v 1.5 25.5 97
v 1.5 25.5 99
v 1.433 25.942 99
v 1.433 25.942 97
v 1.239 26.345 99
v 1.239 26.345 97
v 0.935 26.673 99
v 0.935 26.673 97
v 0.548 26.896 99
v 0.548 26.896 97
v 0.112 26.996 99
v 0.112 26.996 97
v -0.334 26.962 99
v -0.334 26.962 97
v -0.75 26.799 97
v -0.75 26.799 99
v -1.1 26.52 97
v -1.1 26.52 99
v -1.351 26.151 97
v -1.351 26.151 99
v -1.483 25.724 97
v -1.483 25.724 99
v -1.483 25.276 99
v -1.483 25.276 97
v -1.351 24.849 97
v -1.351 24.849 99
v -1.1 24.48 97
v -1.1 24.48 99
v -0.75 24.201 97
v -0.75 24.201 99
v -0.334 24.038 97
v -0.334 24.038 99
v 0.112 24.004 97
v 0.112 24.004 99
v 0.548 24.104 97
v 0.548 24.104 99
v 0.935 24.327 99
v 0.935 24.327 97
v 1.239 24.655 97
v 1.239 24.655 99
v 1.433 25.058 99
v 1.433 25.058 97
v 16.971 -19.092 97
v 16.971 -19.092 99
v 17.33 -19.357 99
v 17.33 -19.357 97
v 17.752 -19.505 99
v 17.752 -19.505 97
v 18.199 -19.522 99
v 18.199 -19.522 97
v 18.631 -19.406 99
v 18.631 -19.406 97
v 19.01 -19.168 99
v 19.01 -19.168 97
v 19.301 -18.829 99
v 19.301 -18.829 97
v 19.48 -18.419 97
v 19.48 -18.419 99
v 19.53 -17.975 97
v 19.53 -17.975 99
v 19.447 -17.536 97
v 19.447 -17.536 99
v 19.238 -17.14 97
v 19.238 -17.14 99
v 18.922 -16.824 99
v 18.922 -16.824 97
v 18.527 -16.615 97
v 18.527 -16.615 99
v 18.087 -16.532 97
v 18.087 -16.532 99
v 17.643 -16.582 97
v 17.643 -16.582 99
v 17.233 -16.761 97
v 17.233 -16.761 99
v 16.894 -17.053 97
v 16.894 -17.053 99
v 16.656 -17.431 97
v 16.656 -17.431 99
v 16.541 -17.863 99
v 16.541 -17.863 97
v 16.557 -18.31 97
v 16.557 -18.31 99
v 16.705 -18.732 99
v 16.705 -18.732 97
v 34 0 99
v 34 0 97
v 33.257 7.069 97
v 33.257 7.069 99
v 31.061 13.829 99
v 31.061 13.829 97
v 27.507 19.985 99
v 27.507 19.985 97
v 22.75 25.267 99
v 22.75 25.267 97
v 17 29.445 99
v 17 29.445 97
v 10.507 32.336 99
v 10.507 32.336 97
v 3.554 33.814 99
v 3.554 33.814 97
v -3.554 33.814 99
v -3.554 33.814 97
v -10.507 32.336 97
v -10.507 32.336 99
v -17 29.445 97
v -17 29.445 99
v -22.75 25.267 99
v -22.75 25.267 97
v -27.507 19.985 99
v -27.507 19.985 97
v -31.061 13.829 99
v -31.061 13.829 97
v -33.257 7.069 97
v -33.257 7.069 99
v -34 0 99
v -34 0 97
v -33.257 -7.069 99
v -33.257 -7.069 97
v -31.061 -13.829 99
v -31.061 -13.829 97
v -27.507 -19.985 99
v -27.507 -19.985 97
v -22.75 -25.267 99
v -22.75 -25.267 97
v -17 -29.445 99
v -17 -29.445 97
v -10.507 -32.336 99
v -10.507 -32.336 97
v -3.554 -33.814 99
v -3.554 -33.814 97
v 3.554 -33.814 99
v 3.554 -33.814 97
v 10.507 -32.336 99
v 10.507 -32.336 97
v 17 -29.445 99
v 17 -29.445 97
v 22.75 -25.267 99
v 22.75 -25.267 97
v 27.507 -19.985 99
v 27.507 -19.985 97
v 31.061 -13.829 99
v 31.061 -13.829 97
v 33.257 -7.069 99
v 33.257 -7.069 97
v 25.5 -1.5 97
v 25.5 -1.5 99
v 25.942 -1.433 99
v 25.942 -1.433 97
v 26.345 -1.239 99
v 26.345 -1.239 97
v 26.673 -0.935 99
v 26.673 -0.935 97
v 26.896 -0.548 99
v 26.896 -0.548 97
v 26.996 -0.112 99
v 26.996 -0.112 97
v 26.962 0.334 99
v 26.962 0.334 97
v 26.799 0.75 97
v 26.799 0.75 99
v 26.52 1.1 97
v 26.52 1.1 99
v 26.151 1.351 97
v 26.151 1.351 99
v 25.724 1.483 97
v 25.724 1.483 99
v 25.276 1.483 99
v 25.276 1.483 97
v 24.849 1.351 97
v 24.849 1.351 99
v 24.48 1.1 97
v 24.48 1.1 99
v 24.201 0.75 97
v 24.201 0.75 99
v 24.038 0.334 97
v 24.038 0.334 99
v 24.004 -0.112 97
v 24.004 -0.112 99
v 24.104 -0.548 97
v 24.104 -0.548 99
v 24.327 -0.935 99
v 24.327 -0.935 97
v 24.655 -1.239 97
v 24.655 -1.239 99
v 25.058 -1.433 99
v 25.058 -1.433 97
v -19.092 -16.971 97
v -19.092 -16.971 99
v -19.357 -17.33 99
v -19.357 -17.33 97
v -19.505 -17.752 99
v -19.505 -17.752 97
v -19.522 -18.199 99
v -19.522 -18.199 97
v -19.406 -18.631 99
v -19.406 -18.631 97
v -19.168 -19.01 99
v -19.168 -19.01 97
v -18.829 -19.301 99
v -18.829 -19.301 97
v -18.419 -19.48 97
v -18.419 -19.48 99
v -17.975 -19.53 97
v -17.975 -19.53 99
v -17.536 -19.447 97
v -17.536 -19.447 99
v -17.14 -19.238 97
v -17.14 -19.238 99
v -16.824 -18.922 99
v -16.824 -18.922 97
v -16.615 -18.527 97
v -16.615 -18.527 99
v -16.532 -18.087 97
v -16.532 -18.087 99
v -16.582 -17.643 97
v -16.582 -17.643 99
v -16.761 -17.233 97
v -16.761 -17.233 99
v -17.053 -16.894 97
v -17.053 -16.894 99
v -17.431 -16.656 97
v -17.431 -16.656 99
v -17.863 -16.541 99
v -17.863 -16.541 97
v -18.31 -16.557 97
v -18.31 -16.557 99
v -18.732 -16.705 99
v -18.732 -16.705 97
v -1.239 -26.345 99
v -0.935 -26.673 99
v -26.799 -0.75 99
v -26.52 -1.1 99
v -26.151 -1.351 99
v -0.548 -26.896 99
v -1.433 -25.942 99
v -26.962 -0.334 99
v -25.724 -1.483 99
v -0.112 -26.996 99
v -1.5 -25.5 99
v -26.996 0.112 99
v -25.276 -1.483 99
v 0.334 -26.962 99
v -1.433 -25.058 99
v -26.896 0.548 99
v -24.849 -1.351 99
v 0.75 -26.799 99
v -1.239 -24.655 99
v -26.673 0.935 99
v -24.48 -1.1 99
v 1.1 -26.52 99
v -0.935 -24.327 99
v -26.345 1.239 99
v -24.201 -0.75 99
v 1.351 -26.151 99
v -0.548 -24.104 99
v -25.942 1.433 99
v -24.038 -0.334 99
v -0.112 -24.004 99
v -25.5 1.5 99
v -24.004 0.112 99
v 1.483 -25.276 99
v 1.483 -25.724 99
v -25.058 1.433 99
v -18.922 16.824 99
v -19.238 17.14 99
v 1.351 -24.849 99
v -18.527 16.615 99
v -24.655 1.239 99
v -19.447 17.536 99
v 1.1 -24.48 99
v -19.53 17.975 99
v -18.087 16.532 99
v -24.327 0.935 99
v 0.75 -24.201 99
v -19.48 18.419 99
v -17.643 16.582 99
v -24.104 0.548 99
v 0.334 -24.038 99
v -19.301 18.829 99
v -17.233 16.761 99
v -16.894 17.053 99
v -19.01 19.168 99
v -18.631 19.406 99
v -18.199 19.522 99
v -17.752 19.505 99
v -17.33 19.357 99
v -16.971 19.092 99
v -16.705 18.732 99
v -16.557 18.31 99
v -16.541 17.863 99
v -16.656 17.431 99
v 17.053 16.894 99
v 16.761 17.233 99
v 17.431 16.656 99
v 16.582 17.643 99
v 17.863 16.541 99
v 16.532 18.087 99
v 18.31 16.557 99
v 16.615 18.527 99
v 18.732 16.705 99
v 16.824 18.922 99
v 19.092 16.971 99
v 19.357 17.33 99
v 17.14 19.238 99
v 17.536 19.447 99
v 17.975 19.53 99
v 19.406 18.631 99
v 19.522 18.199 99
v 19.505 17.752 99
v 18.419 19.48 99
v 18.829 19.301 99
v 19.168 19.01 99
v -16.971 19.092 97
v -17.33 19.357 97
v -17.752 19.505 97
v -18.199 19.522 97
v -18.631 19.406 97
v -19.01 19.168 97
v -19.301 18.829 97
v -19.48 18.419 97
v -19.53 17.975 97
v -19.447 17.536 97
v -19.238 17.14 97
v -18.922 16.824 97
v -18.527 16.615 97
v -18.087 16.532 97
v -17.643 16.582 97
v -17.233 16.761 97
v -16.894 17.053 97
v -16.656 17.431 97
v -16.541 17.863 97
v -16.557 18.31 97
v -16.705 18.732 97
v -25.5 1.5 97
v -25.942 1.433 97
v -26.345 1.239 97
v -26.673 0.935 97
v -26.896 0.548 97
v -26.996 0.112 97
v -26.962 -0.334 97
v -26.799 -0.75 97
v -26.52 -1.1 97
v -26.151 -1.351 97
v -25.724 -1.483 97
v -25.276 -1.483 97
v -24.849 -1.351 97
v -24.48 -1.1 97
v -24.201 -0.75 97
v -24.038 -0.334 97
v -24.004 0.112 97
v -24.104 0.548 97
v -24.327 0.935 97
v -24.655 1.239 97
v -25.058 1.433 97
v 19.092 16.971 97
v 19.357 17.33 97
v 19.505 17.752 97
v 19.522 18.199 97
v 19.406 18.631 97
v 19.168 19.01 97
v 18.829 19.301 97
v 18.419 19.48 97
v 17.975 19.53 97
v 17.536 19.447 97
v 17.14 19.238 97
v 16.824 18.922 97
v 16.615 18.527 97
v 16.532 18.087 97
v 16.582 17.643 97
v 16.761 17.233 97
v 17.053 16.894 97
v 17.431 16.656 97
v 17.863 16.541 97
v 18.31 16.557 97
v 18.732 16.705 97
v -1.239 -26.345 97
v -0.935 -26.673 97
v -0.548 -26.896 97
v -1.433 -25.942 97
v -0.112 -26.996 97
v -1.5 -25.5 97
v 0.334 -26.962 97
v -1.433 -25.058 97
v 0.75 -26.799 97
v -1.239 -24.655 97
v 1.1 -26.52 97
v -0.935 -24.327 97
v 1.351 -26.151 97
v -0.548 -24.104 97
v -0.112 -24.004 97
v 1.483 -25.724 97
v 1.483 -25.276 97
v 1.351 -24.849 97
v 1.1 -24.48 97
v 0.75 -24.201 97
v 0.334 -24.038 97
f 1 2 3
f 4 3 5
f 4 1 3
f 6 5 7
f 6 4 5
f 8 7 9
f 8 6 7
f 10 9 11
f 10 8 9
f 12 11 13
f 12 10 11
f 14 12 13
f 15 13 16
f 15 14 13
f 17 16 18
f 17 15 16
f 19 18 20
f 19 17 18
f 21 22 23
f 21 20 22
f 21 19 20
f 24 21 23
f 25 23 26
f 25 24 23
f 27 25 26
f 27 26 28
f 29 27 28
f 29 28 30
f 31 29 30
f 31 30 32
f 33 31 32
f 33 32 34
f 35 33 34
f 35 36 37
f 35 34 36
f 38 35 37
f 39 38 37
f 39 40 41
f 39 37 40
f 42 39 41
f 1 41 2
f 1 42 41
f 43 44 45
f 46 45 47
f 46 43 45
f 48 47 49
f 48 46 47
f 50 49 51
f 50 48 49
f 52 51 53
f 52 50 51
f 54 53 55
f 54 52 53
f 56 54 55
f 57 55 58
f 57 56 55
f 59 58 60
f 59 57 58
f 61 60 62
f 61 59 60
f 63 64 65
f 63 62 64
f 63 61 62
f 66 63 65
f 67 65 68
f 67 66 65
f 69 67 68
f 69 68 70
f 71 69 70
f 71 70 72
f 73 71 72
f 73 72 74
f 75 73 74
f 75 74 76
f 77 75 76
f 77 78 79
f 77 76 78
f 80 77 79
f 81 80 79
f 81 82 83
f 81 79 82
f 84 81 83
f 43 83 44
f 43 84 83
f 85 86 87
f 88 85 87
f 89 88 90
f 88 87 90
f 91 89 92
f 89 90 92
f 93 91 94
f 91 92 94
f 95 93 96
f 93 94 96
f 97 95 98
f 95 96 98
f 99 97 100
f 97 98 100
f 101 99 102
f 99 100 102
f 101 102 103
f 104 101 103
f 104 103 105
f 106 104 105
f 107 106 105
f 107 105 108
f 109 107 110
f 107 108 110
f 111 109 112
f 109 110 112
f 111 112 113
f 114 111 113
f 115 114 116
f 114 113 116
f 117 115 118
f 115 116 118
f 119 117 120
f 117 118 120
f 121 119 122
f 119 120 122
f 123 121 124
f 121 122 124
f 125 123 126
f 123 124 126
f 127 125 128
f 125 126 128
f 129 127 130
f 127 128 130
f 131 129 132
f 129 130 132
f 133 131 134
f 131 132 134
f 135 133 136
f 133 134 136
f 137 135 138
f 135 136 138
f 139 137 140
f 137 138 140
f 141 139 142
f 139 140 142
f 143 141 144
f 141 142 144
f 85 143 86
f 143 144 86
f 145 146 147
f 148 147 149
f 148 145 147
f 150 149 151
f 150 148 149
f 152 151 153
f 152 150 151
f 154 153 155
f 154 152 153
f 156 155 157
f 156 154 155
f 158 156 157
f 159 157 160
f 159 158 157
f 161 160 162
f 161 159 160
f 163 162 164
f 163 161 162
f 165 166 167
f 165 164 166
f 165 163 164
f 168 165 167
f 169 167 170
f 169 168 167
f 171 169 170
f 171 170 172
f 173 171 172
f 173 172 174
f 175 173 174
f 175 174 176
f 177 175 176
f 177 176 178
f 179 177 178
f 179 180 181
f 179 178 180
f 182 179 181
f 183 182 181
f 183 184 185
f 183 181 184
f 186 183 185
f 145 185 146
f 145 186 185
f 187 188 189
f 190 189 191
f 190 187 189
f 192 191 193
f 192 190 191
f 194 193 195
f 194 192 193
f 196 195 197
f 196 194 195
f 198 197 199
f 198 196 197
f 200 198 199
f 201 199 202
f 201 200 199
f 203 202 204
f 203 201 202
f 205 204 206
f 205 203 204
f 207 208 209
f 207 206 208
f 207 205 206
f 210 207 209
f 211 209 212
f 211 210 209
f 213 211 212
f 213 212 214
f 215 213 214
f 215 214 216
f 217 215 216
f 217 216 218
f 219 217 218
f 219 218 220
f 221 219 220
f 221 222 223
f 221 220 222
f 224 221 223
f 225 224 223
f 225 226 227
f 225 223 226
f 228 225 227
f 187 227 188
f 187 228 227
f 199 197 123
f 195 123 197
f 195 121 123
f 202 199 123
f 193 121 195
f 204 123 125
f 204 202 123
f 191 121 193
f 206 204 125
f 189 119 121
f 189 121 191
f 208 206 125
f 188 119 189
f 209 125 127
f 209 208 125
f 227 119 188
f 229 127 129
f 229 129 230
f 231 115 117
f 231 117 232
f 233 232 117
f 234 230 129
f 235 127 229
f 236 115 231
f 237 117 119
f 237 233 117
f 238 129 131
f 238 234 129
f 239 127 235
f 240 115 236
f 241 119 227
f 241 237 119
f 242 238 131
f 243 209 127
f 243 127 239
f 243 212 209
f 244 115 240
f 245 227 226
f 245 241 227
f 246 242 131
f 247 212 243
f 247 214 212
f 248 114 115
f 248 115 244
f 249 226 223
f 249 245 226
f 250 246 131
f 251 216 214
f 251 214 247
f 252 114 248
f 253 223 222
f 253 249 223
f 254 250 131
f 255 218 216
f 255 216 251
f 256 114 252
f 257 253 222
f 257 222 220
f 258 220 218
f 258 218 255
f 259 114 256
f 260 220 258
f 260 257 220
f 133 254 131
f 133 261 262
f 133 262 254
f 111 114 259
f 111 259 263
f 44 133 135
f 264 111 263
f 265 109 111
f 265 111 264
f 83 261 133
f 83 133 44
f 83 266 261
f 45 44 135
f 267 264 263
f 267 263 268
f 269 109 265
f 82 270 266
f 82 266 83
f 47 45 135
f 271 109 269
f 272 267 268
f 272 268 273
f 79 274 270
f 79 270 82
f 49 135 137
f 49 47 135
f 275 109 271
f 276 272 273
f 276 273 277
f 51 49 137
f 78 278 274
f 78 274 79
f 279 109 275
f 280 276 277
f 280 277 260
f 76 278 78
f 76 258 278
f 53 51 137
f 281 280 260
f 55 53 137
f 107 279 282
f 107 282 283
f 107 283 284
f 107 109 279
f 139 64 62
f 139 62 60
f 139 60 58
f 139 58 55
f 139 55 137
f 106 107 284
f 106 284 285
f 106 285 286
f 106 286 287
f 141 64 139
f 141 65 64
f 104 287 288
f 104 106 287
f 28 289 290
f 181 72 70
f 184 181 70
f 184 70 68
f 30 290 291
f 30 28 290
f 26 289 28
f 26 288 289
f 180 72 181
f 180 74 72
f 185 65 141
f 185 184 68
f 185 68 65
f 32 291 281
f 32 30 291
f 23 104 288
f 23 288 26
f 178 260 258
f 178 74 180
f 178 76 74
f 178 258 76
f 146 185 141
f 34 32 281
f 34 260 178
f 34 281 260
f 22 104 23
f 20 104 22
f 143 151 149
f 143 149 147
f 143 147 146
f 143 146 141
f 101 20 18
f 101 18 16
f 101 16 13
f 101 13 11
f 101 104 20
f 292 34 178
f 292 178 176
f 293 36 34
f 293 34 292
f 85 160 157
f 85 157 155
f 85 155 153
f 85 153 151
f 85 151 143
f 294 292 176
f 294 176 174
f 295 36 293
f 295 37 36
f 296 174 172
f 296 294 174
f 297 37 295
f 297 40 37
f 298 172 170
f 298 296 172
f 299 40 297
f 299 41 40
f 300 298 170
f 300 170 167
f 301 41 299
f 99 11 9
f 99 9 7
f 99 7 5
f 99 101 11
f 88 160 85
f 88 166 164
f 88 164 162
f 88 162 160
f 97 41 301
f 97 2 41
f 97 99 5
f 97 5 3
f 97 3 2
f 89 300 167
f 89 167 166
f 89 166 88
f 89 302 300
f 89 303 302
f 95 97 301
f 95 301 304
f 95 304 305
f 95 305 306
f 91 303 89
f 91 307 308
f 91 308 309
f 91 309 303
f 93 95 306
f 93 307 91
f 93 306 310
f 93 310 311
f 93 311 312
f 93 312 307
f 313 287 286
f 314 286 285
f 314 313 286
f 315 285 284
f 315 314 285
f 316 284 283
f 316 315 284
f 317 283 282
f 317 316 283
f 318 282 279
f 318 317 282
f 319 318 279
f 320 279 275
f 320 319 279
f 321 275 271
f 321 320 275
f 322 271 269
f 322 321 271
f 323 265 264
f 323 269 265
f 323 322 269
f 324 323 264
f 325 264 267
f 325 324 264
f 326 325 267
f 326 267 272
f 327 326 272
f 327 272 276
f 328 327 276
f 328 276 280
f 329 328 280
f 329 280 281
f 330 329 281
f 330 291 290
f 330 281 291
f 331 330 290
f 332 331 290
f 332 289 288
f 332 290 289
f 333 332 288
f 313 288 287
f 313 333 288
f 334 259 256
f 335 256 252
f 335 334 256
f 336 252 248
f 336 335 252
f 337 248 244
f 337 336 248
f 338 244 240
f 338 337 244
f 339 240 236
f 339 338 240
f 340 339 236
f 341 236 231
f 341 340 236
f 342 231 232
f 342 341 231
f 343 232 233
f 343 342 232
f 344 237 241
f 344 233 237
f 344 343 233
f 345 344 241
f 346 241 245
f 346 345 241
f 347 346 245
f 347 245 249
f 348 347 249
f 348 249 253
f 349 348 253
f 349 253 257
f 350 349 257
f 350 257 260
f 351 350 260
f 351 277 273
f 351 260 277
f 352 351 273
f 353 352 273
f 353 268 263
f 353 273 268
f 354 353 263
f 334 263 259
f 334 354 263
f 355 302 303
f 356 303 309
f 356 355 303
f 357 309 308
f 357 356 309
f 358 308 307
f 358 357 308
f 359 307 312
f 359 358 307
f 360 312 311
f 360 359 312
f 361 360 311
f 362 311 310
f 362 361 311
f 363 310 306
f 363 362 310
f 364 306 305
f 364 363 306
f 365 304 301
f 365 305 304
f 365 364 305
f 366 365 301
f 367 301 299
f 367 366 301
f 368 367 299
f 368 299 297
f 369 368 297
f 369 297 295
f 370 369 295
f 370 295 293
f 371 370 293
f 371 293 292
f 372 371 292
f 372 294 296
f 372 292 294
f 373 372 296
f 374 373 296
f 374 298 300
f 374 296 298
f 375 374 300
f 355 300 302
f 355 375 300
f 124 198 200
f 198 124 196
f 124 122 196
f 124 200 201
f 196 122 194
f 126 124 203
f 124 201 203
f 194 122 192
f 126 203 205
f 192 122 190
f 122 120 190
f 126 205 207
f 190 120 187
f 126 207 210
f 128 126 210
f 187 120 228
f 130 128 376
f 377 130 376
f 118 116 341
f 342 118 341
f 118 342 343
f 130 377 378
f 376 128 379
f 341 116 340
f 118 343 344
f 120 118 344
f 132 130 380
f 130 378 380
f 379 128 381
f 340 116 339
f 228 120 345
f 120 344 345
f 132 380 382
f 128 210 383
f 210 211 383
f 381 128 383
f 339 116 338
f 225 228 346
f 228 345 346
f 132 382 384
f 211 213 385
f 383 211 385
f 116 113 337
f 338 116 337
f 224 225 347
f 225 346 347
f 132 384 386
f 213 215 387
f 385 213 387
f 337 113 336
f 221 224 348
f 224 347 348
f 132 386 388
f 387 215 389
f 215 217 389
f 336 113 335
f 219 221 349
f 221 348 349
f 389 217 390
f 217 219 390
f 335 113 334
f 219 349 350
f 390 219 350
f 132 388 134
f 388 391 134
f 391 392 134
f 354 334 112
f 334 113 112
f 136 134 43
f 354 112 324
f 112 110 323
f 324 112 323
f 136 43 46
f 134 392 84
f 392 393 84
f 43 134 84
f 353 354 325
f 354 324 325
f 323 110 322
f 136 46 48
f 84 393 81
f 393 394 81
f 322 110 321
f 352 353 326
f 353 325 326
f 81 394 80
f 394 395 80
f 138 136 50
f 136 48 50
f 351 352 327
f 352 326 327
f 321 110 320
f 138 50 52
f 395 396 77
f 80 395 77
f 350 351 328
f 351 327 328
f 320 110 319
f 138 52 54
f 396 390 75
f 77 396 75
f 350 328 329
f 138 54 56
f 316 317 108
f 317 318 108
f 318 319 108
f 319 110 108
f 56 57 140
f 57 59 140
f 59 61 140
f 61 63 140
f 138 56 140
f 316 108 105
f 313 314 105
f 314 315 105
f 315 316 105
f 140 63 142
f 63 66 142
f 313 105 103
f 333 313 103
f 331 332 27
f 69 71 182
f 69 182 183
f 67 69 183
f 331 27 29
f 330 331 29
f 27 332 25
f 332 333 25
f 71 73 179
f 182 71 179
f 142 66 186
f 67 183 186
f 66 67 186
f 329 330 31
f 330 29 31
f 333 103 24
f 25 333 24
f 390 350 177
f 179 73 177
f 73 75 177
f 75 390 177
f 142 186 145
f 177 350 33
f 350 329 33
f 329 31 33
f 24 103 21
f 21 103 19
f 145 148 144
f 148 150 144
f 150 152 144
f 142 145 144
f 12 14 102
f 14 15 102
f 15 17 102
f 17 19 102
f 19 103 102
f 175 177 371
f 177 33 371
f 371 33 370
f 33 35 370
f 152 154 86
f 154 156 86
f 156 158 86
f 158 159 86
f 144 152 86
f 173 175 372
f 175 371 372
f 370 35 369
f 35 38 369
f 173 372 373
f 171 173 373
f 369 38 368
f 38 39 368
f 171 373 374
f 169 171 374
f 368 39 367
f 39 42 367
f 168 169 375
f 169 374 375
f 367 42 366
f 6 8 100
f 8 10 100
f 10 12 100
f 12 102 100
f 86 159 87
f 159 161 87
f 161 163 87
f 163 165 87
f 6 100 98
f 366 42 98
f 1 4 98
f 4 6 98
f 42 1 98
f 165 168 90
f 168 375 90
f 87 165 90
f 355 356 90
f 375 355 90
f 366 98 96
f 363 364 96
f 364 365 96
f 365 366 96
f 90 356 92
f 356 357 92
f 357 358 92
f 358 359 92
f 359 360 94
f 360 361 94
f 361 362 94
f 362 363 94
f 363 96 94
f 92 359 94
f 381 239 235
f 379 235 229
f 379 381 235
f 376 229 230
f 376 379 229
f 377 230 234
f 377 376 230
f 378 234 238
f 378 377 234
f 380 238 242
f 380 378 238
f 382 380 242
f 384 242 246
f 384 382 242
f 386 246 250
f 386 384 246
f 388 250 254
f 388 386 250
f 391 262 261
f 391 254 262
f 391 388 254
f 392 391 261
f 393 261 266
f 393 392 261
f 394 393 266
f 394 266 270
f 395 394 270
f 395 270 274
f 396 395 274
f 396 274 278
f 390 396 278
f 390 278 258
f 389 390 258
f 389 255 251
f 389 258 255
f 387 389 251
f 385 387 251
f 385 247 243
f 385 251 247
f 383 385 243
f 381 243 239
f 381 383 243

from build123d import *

# Parameters (mm, degrees)
CYLINDER1921_R               = 1.5
CYLINDER1921_DEPTH           = 20
CYLINDER1921_PLACEMENT_ANGLE = 45
CYLINDER1925_R               = 1.5
CYLINDER1925_DEPTH           = 20
CYLINDER1919_R               = 1.5
CYLINDER1919_DEPTH           = 20
CYLINDER1919_PLACEMENT_ANGLE = 135
CYLINDER1920_R               = 1.5
CYLINDER1920_DEPTH           = 20
CYLINDER1922_R               = 1.5
CYLINDER1922_DEPTH           = 20
CYLINDER1922_PLACEMENT_ANGLE = 225
CYLINDER1924_R               = 1.5
CYLINDER1924_DEPTH           = 20
CYLINDER1923_R               = 1.5
CYLINDER1923_DEPTH           = 20
CYLINDER1923_PLACEMENT_ANGLE = 45
CYLINDER1926_R               = 1.5
CYLINDER1926_DEPTH           = 20
CYLINDER1918_R               = 34
CYLINDER1918_DEPTH           = 2


with BuildPart() as v_lec1921:
    # Cylinder1921 → Cylinder1921 (new body)
    with BuildSketch(Plane.XY):
        Circle(CYLINDER1921_R)
    extrude(amount=CYLINDER1921_DEPTH)


with BuildPart() as v_lec1921_1:
    # Cylinder1921 placement: moved
    add(v_lec1921.part.moved(Location((-18.031223, 18.031223, -4))).rotate(Axis((-18.031223, 18.031223, -4), (0, 0, 1)), CYLINDER1921_PLACEMENT_ANGLE))


with BuildPart() as v_lec1925:
    # Cylinder1925 → Cylinder1925 (new body)
    with BuildSketch(Plane(origin=(-25.5, 0, -4), x_dir=(0, 1, 0), z_dir=(0, 0, 1))):
        Circle(CYLINDER1925_R)
    extrude(amount=CYLINDER1925_DEPTH)


with BuildPart() as v_lec1919:
    # Cylinder1919 → Cylinder1919 (new body)
    with BuildSketch(Plane.XY):
        Circle(CYLINDER1919_R)
    extrude(amount=CYLINDER1919_DEPTH)


with BuildPart() as v_lec1919_1:
    # Cylinder1919 placement: moved
    add(v_lec1919.part.moved(Location((-18.031223, -18.031223, -4))).rotate(Axis((-18.031223, -18.031223, -4), (0, 0, 1)), CYLINDER1919_PLACEMENT_ANGLE))


with BuildPart() as v_lec1920:
    # Cylinder1920 → Cylinder1920 (new body)
    with BuildSketch(Plane(origin=(0, -25.5, -4), x_dir=(-1, 0, 0), z_dir=(0, 0, 1))):
        Circle(CYLINDER1920_R)
    extrude(amount=CYLINDER1920_DEPTH)


with BuildPart() as v_lec1922:
    # Cylinder1922 → Cylinder1922 (new body)
    with BuildSketch(Plane.XY):
        Circle(CYLINDER1922_R)
    extrude(amount=CYLINDER1922_DEPTH)


with BuildPart() as v_lec1922_1:
    # Cylinder1922 placement: moved
    add(v_lec1922.part.moved(Location((18.031223, -18.031223, -4))).rotate(Axis((18.031223, -18.031223, -4), (0, 0, 1)), CYLINDER1922_PLACEMENT_ANGLE))


with BuildPart() as v_lec1924:
    # Cylinder1924 → Cylinder1924 (new body)
    with BuildSketch(Plane(origin=(25.5, 0, -4), x_dir=(0, -1, 0), z_dir=(0, 0, 1))):
        Circle(CYLINDER1924_R)
    extrude(amount=CYLINDER1924_DEPTH)


with BuildPart() as v_lec1923:
    # Cylinder1923 → Cylinder1923 (new body)
    with BuildSketch(Plane.XY):
        Circle(CYLINDER1923_R)
    extrude(amount=CYLINDER1923_DEPTH)


with BuildPart() as v_lec1923_1:
    # Cylinder1923 placement: moved
    add(v_lec1923.part.moved(Location((18.031223, 18.031223, -4))).rotate(Axis((18.031223, 18.031223, -4), (0, 0, -1)), CYLINDER1923_PLACEMENT_ANGLE))


with BuildPart() as compound917:
    # Cylinder1926 → Cylinder1926 (new body)
    with BuildSketch(Plane(origin=(0, 25.5, -4), x_dir=(1, 0, 0), z_dir=(0, 0, 1))):
        Circle(CYLINDER1926_R)
    extrude(amount=CYLINDER1926_DEPTH)

    # Compound917: union Válec1921, Válec1925, Válec1919, Válec1920, Válec1922, Válec1924, Válec1923
    add(v_lec1921_1.part)
    add(v_lec1925.part)
    add(v_lec1919_1.part)
    add(v_lec1920.part)
    add(v_lec1922_1.part)
    add(v_lec1924.part)
    add(v_lec1923_1.part)


with BuildPart() as compound917_1:
    # Compound917 placement: moved
    add(compound917.part.moved(Location((0, 0, 100))))


with BuildPart() as cut564:
    # Cylinder1918 → Cylinder1918 (new body)
    with BuildSketch(Plane.XY.offset(96)):
        Circle(CYLINDER1918_R)
    extrude(amount=CYLINDER1918_DEPTH)

    # Cut564: cut Compound917
    add(compound917_1.part, mode=Mode.SUBTRACT)


with BuildPart() as cut564_1:
    # Cut564 placement: moved
    add(cut564.part.moved(Location((0, 0, 1))))


solid = cut564_1.part
